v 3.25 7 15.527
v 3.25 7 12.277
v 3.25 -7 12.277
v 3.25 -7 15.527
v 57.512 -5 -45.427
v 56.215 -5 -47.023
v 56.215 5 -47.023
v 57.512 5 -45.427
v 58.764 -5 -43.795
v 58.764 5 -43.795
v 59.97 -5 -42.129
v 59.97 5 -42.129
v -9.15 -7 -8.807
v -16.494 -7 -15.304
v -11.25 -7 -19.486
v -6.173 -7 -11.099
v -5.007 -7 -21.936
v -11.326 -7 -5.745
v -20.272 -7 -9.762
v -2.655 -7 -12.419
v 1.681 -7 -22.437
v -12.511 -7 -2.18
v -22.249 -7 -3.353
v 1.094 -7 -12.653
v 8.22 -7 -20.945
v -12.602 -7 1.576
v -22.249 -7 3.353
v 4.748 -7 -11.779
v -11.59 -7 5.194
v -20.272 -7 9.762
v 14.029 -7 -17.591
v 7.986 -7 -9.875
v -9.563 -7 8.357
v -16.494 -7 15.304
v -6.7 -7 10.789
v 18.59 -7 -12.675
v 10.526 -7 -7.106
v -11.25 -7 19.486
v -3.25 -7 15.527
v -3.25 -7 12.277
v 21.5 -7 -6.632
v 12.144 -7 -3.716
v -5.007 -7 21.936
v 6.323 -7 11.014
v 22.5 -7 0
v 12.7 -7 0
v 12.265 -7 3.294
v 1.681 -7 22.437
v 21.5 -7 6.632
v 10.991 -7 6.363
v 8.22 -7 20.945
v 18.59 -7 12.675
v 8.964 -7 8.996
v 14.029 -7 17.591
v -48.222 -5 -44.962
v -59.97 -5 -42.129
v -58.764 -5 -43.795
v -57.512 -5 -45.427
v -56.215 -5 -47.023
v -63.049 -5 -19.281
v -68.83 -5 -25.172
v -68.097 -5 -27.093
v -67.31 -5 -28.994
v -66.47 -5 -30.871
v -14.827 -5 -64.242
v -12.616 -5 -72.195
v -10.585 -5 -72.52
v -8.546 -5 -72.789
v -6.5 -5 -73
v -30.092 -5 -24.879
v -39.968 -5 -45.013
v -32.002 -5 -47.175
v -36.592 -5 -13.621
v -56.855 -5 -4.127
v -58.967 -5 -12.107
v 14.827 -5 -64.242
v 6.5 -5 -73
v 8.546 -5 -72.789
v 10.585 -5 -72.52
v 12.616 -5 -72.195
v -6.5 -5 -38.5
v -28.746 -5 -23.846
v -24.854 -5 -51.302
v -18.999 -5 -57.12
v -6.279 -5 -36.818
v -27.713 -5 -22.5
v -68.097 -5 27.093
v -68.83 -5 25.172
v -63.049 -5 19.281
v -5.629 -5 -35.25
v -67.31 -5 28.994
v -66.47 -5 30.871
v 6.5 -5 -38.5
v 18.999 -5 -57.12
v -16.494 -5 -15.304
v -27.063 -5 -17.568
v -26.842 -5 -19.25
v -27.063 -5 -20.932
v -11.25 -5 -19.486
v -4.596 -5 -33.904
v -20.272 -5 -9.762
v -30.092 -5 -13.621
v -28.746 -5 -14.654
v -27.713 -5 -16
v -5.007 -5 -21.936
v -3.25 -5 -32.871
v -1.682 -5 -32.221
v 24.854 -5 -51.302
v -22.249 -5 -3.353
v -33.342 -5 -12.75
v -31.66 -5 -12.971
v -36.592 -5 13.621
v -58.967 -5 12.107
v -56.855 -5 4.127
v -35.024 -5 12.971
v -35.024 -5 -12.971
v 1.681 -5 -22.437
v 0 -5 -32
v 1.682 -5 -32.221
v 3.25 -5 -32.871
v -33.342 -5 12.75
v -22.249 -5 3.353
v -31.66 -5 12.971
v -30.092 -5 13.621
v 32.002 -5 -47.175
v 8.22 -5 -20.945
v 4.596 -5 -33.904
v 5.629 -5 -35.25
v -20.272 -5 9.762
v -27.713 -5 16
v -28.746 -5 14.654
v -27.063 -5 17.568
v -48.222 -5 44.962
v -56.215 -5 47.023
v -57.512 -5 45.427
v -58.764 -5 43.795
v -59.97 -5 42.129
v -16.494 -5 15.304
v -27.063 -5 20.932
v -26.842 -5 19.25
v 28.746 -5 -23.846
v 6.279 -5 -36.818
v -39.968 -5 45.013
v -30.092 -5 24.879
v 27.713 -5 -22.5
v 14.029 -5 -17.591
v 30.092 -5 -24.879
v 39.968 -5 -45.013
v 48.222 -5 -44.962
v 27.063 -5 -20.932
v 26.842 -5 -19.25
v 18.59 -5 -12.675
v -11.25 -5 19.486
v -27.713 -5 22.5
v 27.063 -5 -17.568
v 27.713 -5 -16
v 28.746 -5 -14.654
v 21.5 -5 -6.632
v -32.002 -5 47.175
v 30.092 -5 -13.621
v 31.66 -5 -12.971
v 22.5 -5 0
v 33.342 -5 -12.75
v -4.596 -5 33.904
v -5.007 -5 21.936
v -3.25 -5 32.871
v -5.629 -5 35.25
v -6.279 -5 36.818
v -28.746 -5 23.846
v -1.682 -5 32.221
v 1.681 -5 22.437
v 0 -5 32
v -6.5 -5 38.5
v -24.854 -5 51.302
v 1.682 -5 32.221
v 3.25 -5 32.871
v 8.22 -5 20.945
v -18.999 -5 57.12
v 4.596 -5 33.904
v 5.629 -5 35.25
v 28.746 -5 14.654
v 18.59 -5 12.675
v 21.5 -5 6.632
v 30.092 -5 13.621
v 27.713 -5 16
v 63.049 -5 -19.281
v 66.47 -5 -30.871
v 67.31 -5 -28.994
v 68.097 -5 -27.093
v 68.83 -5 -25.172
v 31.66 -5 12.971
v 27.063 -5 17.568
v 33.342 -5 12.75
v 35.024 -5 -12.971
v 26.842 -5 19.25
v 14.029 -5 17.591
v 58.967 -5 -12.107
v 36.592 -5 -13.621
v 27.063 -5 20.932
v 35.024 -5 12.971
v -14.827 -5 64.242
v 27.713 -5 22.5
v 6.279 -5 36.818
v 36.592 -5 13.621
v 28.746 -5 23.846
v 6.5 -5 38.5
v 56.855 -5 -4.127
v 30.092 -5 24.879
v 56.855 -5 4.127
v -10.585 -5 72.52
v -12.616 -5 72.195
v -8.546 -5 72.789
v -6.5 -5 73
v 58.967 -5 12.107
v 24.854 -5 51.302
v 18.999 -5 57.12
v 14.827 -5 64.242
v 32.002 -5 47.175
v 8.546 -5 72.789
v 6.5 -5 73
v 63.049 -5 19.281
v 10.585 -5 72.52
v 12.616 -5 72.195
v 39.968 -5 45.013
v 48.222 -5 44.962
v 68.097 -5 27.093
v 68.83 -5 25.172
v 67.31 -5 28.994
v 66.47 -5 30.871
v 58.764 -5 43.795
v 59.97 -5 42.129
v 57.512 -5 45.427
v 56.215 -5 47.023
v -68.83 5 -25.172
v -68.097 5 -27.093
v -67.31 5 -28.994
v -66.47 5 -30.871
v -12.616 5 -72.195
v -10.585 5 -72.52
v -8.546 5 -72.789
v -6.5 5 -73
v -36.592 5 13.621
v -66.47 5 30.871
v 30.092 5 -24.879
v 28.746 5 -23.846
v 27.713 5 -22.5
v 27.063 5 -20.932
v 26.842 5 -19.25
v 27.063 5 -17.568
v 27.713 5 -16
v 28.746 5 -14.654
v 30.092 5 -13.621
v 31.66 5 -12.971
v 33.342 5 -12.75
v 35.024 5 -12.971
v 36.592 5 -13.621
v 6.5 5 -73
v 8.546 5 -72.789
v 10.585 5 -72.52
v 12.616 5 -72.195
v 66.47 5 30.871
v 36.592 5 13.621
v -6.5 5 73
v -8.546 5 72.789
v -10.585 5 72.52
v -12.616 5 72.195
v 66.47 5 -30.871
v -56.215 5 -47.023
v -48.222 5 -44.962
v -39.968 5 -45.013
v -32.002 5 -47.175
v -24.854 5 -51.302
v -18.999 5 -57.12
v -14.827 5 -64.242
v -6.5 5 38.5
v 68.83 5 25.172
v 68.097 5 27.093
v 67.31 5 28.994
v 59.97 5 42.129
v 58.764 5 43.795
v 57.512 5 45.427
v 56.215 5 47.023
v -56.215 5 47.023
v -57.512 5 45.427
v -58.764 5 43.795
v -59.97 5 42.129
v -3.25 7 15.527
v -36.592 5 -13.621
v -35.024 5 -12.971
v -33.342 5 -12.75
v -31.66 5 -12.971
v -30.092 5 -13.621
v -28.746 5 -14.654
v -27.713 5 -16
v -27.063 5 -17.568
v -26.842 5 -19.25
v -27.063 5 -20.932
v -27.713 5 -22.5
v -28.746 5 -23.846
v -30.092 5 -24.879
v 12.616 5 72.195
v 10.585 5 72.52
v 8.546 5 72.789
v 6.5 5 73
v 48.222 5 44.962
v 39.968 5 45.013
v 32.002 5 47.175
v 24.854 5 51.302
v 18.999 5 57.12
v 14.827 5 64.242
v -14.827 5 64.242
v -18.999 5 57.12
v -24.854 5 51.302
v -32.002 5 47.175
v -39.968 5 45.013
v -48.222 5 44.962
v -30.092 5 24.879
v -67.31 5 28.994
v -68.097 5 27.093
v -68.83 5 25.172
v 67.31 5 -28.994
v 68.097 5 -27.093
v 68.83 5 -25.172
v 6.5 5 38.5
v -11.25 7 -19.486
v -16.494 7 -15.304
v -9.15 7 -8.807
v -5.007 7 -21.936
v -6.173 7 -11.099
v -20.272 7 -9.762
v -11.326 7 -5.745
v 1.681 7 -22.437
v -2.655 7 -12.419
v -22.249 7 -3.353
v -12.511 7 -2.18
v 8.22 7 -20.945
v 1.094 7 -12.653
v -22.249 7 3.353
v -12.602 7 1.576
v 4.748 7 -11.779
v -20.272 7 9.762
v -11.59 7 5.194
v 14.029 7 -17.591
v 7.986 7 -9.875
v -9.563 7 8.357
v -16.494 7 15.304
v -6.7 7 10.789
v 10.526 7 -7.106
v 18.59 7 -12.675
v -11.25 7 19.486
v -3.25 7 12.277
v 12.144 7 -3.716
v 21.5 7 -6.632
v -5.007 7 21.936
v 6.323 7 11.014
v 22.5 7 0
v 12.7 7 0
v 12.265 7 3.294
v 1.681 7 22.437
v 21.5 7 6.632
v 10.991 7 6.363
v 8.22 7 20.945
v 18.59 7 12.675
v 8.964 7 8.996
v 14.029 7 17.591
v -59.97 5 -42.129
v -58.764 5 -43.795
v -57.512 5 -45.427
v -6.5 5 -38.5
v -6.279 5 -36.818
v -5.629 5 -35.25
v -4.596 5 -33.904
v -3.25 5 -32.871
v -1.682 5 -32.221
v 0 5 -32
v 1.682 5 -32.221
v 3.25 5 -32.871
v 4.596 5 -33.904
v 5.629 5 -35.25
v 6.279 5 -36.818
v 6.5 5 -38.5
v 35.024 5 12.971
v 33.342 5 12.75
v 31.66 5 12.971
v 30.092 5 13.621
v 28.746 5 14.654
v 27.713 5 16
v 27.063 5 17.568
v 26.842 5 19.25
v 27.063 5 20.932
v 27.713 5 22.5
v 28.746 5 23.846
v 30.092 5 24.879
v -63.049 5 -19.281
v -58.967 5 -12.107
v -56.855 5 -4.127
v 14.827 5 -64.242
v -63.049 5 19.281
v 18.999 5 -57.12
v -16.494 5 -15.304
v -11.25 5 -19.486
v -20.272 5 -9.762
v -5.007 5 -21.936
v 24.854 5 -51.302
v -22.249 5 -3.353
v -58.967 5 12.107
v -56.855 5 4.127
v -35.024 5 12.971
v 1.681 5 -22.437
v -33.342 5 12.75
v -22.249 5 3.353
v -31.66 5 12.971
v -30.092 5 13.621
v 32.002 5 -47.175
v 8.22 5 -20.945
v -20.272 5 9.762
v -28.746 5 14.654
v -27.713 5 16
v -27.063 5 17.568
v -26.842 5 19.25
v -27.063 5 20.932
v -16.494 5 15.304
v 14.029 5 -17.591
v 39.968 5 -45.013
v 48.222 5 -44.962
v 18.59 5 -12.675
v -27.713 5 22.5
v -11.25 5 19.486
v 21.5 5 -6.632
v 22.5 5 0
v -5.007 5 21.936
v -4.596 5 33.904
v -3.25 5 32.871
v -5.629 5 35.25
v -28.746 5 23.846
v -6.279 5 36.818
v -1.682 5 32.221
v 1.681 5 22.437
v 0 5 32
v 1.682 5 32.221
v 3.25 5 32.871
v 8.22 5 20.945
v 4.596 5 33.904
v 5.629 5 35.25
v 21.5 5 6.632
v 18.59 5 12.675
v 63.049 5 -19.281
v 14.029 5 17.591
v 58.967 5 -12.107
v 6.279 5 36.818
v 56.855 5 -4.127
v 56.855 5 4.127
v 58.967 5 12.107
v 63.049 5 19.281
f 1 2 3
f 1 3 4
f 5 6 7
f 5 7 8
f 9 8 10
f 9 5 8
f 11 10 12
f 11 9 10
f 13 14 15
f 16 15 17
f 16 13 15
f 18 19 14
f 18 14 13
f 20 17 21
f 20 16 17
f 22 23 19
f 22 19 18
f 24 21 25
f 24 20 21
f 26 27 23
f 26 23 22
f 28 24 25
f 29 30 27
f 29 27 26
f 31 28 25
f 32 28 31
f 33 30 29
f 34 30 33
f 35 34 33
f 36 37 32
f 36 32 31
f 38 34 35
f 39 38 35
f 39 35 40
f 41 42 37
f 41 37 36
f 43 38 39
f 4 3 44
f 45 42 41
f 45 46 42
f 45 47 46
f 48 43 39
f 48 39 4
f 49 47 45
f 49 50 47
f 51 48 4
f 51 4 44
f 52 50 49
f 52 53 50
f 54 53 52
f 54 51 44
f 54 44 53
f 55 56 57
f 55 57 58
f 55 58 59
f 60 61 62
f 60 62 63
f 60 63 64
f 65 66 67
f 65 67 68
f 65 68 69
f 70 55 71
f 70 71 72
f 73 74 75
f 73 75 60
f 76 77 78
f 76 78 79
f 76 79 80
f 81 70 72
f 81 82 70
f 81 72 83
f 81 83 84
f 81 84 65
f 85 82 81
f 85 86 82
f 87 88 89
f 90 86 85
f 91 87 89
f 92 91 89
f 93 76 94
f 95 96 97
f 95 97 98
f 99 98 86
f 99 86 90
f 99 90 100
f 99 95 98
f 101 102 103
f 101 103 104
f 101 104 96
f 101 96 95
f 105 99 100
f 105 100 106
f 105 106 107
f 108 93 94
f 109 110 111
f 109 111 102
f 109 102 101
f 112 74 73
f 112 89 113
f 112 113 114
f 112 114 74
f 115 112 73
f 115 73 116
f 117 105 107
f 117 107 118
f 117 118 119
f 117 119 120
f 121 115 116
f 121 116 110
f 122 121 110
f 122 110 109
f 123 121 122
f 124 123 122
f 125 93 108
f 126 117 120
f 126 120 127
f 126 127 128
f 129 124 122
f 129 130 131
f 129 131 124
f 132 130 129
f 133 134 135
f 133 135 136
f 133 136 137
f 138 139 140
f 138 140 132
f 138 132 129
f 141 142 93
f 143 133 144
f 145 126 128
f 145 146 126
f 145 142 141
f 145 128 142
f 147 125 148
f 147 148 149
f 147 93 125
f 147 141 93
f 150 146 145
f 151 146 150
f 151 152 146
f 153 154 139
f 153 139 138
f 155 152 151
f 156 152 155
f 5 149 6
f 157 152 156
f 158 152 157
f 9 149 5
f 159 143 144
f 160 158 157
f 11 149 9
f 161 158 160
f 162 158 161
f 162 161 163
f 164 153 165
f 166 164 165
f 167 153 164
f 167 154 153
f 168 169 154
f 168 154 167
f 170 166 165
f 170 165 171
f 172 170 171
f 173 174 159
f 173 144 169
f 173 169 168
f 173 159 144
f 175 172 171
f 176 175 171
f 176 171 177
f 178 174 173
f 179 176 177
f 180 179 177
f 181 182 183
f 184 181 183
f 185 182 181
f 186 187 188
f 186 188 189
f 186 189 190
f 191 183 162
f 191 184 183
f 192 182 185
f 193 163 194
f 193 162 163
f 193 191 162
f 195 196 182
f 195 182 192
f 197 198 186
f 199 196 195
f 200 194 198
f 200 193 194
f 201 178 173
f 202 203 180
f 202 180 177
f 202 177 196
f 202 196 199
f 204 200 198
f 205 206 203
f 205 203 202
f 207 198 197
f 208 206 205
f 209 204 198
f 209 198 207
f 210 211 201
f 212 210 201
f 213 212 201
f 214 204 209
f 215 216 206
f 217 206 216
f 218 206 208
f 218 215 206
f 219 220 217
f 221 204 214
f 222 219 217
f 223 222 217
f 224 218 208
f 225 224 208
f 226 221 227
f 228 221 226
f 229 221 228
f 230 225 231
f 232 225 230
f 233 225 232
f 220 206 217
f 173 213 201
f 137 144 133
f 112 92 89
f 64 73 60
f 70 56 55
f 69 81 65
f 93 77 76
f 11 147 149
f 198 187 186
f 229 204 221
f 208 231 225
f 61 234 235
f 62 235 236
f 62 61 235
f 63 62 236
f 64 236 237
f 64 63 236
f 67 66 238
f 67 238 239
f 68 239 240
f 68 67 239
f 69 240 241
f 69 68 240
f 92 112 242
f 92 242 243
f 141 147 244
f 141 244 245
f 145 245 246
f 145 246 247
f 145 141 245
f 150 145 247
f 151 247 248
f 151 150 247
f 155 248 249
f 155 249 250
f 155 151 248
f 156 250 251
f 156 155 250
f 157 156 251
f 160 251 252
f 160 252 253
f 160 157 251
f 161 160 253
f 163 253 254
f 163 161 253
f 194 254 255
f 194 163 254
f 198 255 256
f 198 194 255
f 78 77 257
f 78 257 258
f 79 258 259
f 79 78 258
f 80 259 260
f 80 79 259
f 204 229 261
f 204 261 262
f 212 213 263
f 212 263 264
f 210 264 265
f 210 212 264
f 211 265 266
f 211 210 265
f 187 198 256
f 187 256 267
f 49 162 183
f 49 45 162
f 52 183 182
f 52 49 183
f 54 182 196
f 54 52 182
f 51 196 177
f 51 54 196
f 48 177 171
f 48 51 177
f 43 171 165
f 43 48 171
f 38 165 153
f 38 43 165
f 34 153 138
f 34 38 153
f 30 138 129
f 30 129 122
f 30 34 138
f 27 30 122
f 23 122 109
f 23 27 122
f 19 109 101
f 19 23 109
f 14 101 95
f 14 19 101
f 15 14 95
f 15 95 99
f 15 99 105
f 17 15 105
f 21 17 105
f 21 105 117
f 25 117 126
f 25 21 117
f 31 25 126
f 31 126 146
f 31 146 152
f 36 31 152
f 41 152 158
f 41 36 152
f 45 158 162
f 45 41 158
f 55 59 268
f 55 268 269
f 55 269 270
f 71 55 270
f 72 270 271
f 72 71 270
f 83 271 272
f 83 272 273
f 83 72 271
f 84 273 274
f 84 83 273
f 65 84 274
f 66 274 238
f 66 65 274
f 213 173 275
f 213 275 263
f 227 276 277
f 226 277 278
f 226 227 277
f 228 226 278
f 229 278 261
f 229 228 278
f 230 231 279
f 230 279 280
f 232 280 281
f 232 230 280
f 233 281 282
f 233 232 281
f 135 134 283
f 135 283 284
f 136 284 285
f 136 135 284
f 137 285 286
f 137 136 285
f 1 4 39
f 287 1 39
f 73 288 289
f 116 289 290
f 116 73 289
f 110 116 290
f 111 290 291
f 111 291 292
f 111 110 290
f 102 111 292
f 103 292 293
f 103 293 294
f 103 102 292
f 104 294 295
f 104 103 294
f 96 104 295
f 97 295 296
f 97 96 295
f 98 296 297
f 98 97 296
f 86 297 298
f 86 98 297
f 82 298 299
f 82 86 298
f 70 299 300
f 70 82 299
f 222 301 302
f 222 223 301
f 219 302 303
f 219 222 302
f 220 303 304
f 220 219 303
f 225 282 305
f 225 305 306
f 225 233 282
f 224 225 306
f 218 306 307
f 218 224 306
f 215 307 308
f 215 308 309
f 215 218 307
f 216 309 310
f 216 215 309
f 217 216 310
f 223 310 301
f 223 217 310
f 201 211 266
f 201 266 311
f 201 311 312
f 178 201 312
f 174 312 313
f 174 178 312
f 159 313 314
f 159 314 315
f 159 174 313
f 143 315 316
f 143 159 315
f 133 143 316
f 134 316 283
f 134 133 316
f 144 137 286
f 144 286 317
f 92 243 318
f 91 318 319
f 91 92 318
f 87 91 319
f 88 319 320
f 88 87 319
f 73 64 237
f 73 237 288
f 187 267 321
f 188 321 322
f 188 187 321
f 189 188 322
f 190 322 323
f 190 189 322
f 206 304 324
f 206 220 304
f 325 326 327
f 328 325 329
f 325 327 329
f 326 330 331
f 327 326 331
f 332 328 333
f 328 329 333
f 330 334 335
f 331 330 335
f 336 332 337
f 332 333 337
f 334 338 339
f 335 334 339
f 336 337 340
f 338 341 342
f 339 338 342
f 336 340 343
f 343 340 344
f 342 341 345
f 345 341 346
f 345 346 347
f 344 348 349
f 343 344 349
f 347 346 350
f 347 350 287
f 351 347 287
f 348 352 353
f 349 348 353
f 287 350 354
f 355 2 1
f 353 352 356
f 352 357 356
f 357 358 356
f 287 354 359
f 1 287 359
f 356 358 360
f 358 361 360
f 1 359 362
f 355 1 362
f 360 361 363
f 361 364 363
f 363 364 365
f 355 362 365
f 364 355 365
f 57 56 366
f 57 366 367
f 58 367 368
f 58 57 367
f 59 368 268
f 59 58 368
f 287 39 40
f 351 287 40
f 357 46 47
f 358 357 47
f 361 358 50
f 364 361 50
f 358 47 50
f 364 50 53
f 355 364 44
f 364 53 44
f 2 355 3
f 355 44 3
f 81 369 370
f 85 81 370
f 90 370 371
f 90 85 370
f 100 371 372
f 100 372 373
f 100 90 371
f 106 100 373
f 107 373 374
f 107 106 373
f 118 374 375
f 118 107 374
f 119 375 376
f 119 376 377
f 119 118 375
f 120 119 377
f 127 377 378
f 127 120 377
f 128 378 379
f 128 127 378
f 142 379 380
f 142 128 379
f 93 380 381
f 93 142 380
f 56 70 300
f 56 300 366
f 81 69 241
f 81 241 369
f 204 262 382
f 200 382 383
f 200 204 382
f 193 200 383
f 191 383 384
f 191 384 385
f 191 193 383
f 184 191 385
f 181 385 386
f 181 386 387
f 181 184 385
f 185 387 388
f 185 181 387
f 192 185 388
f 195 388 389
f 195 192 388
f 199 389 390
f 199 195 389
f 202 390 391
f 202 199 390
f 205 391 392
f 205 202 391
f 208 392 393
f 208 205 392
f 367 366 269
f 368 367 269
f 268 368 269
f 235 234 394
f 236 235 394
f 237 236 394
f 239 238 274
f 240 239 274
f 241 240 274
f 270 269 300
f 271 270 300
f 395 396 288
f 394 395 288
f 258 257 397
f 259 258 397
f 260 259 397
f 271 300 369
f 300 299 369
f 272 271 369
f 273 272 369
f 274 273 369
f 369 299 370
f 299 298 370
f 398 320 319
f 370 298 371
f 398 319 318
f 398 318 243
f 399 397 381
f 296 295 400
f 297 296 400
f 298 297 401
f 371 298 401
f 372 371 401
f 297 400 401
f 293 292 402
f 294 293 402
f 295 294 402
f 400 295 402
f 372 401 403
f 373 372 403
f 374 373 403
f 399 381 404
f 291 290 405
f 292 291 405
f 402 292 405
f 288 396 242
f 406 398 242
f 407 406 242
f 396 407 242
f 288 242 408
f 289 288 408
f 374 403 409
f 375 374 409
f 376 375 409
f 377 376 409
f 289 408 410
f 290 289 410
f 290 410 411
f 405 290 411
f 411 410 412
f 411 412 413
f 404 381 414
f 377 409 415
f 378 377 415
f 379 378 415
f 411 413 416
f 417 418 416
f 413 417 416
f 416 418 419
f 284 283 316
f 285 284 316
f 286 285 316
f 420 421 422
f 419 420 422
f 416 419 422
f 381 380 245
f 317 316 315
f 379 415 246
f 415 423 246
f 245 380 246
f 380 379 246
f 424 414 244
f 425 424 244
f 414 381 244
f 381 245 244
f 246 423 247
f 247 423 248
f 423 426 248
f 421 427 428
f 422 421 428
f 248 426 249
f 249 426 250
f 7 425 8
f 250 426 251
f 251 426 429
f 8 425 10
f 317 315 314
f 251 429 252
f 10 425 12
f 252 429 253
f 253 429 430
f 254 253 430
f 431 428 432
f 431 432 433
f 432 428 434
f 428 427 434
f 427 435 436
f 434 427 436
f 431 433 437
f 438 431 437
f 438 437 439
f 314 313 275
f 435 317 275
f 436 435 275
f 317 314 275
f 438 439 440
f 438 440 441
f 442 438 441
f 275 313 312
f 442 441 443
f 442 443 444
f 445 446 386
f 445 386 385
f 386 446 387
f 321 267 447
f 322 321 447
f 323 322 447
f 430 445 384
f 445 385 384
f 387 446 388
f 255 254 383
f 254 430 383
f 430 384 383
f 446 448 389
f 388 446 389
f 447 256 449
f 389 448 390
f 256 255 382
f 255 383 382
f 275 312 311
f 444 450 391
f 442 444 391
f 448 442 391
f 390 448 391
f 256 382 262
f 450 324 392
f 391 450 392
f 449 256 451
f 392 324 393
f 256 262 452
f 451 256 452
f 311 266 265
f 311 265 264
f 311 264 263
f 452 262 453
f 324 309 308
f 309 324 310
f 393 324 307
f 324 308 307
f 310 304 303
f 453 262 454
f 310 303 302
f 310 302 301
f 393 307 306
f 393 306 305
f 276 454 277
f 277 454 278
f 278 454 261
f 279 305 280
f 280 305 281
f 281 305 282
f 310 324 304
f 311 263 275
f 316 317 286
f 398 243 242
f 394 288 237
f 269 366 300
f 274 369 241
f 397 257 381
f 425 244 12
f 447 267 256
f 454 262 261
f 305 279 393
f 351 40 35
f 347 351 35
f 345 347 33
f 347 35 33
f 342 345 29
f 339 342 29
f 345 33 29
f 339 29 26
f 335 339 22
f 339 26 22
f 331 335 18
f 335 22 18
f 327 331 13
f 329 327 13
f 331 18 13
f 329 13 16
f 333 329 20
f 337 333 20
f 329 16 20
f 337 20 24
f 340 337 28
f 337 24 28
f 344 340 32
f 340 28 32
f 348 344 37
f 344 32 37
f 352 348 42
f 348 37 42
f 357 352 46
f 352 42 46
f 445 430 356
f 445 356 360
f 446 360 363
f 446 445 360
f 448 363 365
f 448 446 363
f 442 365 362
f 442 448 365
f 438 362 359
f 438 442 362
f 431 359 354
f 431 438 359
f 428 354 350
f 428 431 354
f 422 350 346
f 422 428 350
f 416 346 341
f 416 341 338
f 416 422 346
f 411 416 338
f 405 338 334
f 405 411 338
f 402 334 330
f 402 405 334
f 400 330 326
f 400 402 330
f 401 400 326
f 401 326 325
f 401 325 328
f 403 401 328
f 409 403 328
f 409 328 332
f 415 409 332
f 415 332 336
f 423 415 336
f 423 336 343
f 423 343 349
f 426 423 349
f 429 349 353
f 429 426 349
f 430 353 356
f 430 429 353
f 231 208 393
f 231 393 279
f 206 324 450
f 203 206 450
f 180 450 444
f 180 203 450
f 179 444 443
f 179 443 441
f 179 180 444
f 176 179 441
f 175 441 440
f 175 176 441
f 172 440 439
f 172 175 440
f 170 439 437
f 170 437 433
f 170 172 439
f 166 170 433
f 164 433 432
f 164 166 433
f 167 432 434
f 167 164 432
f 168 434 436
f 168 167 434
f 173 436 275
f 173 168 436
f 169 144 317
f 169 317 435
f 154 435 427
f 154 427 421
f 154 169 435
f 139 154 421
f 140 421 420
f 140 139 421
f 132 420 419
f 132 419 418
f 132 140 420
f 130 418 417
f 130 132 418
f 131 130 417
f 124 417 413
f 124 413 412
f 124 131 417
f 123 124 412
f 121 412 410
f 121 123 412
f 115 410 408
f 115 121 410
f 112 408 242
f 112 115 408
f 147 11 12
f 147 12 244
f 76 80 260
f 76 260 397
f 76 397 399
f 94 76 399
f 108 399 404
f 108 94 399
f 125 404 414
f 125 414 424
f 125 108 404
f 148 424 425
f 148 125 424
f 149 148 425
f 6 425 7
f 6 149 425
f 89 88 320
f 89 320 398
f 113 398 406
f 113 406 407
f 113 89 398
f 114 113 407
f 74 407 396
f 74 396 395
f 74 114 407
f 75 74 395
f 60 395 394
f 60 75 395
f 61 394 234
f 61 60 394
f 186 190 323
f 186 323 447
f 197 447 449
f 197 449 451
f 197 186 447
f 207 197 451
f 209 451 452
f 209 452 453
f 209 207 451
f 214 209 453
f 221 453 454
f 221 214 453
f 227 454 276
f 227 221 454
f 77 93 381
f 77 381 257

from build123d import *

# Parameters (mm, degrees)
F1_DEPTH = 5
F2_R     = 22.5
F3_DEPTH = 7
F5_DEPTH = 12.5


with BuildPart() as f1:
    # F0 (on Front) → F1 (new body, symmetric)
    with BuildSketch(Plane.XZ):
        with BuildLine():
            Line((6.5, 73), (6.5, 38.5))
            ThreePointArc((6.5, 38.5), (4.5961940777, 33.9038059223), (0, 32))
            ThreePointArc((0, 32), (-4.5961940777, 33.9038059223), (-6.5, 38.5))
            Line((-6.5, 38.5), (-6.5, 73))
            ThreePointArc((-6.5, 73), (-9.566281029, 72.6617937246), (-12.6156130875, 72.1948495838))
            ThreePointArc((-12.6156130875, 72.1948495838), (-28.294097646, 49.0068146771), (-56.2147672182, 47.02286621))
            ThreePointArc((-56.2147672182, 47.02286621), (-58.1438187355, 44.6155392532), (-59.9698544763, 42.1291651246))
            Line((-59.9698544763, 42.1291651246), (-30.0919780457, 24.8791651246))
            ThreePointArc((-30.0919780457, 24.8791651246), (-27.0634601748, 20.9323237932), (-27.7128129211, 16))
            ThreePointArc((-27.7128129211, 16), (-31.6596542525, 12.9714821291), (-36.5919780457, 13.6208348754))
            Line((-36.5919780457, 13.6208348754), (-66.4698544763, 30.8708348754))
            ThreePointArc((-66.4698544763, 30.8708348754), (-67.7100997645, 28.0462544714), (-68.8303803057, 25.1719833738))
            ThreePointArc((-68.8303803057, 25.1719833738), (-56.5881952919, 0), (-68.8303803057, -25.1719833738))
            ThreePointArc((-68.8303803057, -25.1719833738), (-67.7100997645, -28.0462544714), (-66.4698544763, -30.8708348754))
            Line((-66.4698544763, -30.8708348754), (-36.5919780457, -13.6208348754))
            ThreePointArc((-36.5919780457, -13.6208348754), (-31.6596542525, -12.9714821291), (-27.7128129211, -16))
            ThreePointArc((-27.7128129211, -16), (-27.0634601748, -20.9323237932), (-30.0919780457, -24.8791651246))
            Line((-30.0919780457, -24.8791651246), (-59.9698544763, -42.1291651246))
            ThreePointArc((-59.9698544763, -42.1291651246), (-58.1438187355, -44.6155392532), (-56.2147672182, -47.02286621))
            ThreePointArc((-56.2147672182, -47.02286621), (-28.294097646, -49.0068146771), (-12.6156130875, -72.1948495838))
            ThreePointArc((-12.6156130875, -72.1948495838), (-9.566281029, -72.6617937246), (-6.5, -73))
            Line((-6.5, -73), (-6.5, -38.5))
            ThreePointArc((-6.5, -38.5), (-4.5961940777, -33.9038059223), (0, -32))
            ThreePointArc((0, -32), (4.5961940777, -33.9038059223), (6.5, -38.5))
            Line((6.5, -38.5), (6.5, -73))
            ThreePointArc((6.5, -73), (9.566281029, -72.6617937246), (12.6156130875, -72.1948495838))
            ThreePointArc((12.6156130875, -72.1948495838), (28.294097646, -49.0068146771), (56.2147672182, -47.02286621))
            ThreePointArc((56.2147672182, -47.02286621), (58.1438187355, -44.6155392532), (59.9698544763, -42.1291651246))
            Line((59.9698544763, -42.1291651246), (30.0919780457, -24.8791651246))
            ThreePointArc((30.0919780457, -24.8791651246), (27.0634601748, -20.9323237932), (27.7128129211, -16))
            ThreePointArc((27.7128129211, -16), (31.6596542525, -12.9714821291), (36.5919780457, -13.6208348754))
            Line((36.5919780457, -13.6208348754), (66.4698544763, -30.8708348754))
            ThreePointArc((66.4698544763, -30.8708348754), (67.7100997645, -28.0462544714), (68.8303803057, -25.1719833738))
            ThreePointArc((68.8303803057, -25.1719833738), (56.5881952919, 0), (68.8303803057, 25.1719833738))
            ThreePointArc((68.8303803057, 25.1719833738), (67.7100997645, 28.0462544714), (66.4698544763, 30.8708348754))
            Line((66.4698544763, 30.8708348754), (36.5919780457, 13.6208348754))
            ThreePointArc((36.5919780457, 13.6208348754), (31.6596542525, 12.9714821291), (27.7128129211, 16))
            ThreePointArc((27.7128129211, 16), (27.0634601748, 20.9323237932), (30.0919780457, 24.8791651246))
            Line((30.0919780457, 24.8791651246), (59.9698544763, 42.1291651246))
            ThreePointArc((59.9698544763, 42.1291651246), (58.1438187355, 44.6155392532), (56.2147672182, 47.02286621))
            ThreePointArc((56.2147672182, 47.02286621), (28.294097646, 49.0068146771), (12.6156130875, 72.1948495838))
            ThreePointArc((12.6156130875, 72.1948495838), (9.566281029, 72.6617937246), (6.5, 73))
        make_face()
    extrude(amount=F1_DEPTH, both=True)

    # F2 (on Front) → F3 (join, symmetric)
    with BuildSketch(Plane.XZ):
        Circle(F2_R)
    extrude(amount=F3_DEPTH, both=True)

    # F4 (on Front) → F5 (cut, symmetric)
    with BuildSketch(Plane.XZ):
        with BuildLine():
            ThreePointArc((-3.25, 12.2771128528), (-7.7464508002, -10.0639207072), (12.7, 0))
            ThreePointArc((12.7, 0), (10.0639207072, 7.7464508002), (3.25, 12.2771128528))
            Line((3.25, 12.2771128528), (-3.25, 12.2771128528))
        make_face()
        with BuildLine():
            Line((-3.25, 12.2771128528), (3.25, 12.2771128528))
            ThreePointArc((3.25, 12.2771128528), (0, 12.7), (-3.25, 12.2771128528))
        make_face()
        with BuildLine():
            ThreePointArc((-3.25, 12.2771128528), (0, 12.7), (3.25, 12.2771128528))
            Line((3.25, 12.2771128528), (3.25, 15.5271128528))
            Line((3.25, 15.5271128528), (-3.25, 15.5271128528))
            Line((-3.25, 15.5271128528), (-3.25, 12.2771128528))
        make_face()
    extrude(amount=F5_DEPTH, both=True, mode=Mode.SUBTRACT)


solid = f1.part
